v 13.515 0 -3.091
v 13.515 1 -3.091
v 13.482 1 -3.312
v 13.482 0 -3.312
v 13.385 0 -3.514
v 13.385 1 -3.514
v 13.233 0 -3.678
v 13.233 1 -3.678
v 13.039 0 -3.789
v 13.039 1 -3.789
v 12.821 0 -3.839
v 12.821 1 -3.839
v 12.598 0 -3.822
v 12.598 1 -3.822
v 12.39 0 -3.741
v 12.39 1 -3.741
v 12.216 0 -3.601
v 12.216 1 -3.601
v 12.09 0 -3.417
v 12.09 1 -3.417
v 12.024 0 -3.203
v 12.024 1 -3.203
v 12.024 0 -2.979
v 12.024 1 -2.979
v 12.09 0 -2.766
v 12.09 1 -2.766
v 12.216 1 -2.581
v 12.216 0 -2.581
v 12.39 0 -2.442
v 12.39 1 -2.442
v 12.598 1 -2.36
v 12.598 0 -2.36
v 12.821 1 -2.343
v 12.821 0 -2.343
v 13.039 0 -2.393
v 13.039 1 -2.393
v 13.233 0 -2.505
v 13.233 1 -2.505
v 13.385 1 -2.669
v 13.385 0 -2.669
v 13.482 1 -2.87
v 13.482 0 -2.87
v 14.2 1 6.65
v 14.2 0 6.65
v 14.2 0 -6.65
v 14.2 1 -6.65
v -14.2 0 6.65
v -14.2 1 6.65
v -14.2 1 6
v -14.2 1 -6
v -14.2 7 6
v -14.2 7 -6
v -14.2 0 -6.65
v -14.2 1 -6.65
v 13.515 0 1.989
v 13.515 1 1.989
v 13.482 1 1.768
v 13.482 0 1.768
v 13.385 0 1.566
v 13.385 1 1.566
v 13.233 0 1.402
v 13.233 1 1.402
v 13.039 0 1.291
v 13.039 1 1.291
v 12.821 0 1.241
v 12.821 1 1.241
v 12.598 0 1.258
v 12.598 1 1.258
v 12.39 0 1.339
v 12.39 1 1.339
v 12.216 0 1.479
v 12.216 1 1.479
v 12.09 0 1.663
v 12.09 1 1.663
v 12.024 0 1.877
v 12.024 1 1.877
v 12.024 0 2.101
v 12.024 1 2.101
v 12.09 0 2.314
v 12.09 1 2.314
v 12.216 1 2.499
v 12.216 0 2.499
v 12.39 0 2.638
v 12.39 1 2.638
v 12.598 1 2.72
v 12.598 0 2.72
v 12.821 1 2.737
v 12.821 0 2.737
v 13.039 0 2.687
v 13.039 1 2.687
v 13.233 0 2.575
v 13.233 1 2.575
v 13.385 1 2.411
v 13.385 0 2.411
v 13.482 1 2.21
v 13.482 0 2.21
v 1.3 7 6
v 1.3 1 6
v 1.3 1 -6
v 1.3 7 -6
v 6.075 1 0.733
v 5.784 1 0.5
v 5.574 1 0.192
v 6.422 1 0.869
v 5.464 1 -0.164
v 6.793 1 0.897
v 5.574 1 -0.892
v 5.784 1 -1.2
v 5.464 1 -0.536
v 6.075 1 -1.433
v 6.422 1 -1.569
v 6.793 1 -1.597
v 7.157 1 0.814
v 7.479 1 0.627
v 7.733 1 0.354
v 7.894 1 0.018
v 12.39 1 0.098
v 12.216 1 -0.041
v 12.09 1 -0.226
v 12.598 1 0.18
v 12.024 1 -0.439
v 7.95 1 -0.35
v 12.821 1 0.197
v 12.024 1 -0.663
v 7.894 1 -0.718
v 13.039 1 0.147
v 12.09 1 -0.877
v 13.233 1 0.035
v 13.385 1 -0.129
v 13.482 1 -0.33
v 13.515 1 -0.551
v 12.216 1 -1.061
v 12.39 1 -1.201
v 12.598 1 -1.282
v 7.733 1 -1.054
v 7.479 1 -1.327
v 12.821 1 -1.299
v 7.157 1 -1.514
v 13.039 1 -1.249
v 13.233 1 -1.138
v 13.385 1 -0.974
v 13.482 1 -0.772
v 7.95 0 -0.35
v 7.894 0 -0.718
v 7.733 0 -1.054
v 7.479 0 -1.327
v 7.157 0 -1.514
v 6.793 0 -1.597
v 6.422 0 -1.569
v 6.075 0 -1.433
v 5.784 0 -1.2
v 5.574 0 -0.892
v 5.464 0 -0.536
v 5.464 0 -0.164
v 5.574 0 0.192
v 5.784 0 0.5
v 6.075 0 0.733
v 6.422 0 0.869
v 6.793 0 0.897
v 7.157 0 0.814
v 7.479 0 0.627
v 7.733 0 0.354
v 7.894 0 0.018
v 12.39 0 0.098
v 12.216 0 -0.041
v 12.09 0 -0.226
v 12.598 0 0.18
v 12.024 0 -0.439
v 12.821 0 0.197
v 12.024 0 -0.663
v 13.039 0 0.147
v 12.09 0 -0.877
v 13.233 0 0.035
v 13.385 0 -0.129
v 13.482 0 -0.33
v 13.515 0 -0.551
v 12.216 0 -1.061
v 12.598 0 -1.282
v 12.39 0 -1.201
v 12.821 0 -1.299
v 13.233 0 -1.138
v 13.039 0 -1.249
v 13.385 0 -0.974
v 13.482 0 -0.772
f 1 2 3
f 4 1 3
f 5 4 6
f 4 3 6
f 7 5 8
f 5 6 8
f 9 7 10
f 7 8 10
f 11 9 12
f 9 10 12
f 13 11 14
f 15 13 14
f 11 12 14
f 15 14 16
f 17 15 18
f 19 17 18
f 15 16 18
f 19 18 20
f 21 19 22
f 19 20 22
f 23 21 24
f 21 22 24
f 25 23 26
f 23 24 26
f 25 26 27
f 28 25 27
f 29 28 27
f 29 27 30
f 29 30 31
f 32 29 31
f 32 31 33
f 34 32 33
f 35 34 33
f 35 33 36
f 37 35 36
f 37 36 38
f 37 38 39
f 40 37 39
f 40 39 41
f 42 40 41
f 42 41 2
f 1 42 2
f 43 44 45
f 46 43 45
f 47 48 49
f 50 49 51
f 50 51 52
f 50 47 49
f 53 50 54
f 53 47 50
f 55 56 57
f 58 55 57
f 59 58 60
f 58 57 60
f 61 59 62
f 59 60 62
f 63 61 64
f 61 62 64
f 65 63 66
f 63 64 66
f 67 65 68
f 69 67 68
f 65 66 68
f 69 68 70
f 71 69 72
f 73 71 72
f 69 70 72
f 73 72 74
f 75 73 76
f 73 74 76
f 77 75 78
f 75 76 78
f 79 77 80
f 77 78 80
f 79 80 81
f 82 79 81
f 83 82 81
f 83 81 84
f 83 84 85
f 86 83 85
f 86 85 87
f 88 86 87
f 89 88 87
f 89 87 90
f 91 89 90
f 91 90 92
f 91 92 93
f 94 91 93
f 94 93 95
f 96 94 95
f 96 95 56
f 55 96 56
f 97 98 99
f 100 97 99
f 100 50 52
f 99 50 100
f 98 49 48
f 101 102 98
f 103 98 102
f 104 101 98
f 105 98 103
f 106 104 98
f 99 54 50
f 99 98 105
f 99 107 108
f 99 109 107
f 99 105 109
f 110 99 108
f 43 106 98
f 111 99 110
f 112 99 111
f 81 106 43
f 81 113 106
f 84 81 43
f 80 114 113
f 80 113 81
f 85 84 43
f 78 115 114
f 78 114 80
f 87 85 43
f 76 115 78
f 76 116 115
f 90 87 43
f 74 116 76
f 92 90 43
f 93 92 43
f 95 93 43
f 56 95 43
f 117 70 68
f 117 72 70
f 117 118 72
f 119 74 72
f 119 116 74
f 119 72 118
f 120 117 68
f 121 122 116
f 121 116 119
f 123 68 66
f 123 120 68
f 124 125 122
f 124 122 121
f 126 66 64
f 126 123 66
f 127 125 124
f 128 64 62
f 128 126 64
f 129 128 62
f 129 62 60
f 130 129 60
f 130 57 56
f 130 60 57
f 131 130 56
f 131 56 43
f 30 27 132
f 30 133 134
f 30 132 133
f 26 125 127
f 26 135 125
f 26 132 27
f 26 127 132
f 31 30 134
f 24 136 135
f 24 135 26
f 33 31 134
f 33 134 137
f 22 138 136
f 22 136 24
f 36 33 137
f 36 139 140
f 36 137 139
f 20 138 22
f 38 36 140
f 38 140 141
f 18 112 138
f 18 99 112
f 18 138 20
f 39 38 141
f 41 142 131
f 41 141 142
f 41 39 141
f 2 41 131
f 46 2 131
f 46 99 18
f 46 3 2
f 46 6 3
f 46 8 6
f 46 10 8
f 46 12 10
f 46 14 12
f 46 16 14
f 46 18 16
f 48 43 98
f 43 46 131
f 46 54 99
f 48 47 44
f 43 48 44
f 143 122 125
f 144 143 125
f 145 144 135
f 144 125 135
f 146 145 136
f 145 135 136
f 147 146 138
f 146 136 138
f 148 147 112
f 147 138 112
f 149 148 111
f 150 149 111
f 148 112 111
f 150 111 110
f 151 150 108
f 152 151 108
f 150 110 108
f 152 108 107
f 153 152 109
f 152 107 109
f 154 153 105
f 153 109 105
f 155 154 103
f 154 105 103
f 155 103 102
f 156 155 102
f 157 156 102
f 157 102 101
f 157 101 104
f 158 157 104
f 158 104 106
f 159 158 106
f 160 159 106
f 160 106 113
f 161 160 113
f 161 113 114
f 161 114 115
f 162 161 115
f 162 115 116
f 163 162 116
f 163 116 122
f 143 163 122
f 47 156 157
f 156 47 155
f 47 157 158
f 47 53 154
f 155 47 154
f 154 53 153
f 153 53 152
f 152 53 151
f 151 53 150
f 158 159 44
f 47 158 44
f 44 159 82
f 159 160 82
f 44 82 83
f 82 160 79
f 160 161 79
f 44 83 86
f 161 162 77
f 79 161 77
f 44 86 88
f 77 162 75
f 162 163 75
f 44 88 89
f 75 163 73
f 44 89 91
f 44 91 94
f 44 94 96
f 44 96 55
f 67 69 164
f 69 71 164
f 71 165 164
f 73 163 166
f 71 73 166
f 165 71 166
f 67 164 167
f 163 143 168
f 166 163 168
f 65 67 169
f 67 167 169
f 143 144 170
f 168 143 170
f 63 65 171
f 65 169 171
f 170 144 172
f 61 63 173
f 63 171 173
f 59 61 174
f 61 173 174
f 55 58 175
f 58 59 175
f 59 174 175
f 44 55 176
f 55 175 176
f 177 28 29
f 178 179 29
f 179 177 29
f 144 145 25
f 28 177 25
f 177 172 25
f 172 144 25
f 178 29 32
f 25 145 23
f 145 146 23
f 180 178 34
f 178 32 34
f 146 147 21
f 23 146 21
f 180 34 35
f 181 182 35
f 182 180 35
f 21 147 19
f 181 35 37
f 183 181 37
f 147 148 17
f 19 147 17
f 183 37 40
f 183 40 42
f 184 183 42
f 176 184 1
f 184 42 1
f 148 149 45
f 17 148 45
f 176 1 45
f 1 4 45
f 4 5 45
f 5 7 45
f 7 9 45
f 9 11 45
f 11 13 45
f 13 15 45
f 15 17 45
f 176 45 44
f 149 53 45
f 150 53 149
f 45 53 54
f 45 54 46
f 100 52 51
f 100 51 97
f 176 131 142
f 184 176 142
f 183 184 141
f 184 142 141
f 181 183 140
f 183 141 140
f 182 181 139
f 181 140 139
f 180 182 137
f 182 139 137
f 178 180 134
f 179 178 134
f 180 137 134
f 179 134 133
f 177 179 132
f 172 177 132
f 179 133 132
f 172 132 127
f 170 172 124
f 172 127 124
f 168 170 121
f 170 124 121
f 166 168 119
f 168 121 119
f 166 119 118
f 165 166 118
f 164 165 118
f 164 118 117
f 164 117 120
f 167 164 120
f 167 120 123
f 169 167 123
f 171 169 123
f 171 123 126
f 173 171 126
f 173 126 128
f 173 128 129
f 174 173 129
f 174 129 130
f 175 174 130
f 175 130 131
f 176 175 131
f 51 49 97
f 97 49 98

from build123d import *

# Parameters (mm, degrees)
SKETCH_1_W             = 28.4
SKETCH_1_H             = 13.3
EXTRUDE_1_DEPTH        = 1
SKETCH_2_R             = 1.25
CUT_EXTRUDE_1_DEPTH    = 2
EXTRUDE_START          = -1
SKETCH_3_W             = 15.5
SKETCH_3_H             = 12
EXTRUDE_2_DEPTH        = 7
SKETCH_4_R             = 0.75
CUT_EXTRUDE_2_DEPTH    = 2
PATTERN_LINEAR_1_COUNT = 3
PATTERN_LINEAR_1_PITCH = 2.54


with BuildPart() as part:
    # 草图1 → 凸台-拉伸1 (new body)
    with BuildSketch(Plane(origin=(0, 0, 0), x_dir=(1, 0, 0), z_dir=(0, 1, 0))):
        Rectangle(SKETCH_1_W, SKETCH_1_H)
    extrude(amount=EXTRUDE_1_DEPTH)

    # 草图2 → 切除-拉伸1 (cut, through all)
    with BuildSketch(Plane(origin=(0, 1, 0), x_dir=(1, 0, 0), z_dir=(0, 1, 0))):
        with Locations((6.7, 0.35)):
            Circle(SKETCH_2_R)
    extrude(amount=-CUT_EXTRUDE_1_DEPTH, mode=Mode.SUBTRACT)

    # 草图3 → 凸台-拉伸2 (add)
    with BuildSketch(Plane(origin=(0, 1, 0), x_dir=(1, 0, 0), z_dir=(0, 1, 0)).offset(EXTRUDE_START)):
        with Locations((-6.45, 0)):
            Rectangle(SKETCH_3_W, SKETCH_3_H)
    extrude(amount=EXTRUDE_2_DEPTH)

    # 草图4 → 切除-拉伸2 (cut, through all)
    with BuildSketch(Plane(origin=(0, 1, 0), x_dir=(1, 0, 0), z_dir=(0, 1, 0))):
        with Locations((12.765289475, 3.091279596)):
            Circle(SKETCH_4_R)
    cut_extrude_2 = extrude(amount=-CUT_EXTRUDE_2_DEPTH, mode=Mode.SUBTRACT)

    # 阵列(线性)1: 切除-拉伸2 ×3
    with Locations(*[(0, 0, i * PATTERN_LINEAR_1_PITCH) for i in range(1, PATTERN_LINEAR_1_COUNT)]):
        add(cut_extrude_2, mode=Mode.SUBTRACT)


solid = part.part
